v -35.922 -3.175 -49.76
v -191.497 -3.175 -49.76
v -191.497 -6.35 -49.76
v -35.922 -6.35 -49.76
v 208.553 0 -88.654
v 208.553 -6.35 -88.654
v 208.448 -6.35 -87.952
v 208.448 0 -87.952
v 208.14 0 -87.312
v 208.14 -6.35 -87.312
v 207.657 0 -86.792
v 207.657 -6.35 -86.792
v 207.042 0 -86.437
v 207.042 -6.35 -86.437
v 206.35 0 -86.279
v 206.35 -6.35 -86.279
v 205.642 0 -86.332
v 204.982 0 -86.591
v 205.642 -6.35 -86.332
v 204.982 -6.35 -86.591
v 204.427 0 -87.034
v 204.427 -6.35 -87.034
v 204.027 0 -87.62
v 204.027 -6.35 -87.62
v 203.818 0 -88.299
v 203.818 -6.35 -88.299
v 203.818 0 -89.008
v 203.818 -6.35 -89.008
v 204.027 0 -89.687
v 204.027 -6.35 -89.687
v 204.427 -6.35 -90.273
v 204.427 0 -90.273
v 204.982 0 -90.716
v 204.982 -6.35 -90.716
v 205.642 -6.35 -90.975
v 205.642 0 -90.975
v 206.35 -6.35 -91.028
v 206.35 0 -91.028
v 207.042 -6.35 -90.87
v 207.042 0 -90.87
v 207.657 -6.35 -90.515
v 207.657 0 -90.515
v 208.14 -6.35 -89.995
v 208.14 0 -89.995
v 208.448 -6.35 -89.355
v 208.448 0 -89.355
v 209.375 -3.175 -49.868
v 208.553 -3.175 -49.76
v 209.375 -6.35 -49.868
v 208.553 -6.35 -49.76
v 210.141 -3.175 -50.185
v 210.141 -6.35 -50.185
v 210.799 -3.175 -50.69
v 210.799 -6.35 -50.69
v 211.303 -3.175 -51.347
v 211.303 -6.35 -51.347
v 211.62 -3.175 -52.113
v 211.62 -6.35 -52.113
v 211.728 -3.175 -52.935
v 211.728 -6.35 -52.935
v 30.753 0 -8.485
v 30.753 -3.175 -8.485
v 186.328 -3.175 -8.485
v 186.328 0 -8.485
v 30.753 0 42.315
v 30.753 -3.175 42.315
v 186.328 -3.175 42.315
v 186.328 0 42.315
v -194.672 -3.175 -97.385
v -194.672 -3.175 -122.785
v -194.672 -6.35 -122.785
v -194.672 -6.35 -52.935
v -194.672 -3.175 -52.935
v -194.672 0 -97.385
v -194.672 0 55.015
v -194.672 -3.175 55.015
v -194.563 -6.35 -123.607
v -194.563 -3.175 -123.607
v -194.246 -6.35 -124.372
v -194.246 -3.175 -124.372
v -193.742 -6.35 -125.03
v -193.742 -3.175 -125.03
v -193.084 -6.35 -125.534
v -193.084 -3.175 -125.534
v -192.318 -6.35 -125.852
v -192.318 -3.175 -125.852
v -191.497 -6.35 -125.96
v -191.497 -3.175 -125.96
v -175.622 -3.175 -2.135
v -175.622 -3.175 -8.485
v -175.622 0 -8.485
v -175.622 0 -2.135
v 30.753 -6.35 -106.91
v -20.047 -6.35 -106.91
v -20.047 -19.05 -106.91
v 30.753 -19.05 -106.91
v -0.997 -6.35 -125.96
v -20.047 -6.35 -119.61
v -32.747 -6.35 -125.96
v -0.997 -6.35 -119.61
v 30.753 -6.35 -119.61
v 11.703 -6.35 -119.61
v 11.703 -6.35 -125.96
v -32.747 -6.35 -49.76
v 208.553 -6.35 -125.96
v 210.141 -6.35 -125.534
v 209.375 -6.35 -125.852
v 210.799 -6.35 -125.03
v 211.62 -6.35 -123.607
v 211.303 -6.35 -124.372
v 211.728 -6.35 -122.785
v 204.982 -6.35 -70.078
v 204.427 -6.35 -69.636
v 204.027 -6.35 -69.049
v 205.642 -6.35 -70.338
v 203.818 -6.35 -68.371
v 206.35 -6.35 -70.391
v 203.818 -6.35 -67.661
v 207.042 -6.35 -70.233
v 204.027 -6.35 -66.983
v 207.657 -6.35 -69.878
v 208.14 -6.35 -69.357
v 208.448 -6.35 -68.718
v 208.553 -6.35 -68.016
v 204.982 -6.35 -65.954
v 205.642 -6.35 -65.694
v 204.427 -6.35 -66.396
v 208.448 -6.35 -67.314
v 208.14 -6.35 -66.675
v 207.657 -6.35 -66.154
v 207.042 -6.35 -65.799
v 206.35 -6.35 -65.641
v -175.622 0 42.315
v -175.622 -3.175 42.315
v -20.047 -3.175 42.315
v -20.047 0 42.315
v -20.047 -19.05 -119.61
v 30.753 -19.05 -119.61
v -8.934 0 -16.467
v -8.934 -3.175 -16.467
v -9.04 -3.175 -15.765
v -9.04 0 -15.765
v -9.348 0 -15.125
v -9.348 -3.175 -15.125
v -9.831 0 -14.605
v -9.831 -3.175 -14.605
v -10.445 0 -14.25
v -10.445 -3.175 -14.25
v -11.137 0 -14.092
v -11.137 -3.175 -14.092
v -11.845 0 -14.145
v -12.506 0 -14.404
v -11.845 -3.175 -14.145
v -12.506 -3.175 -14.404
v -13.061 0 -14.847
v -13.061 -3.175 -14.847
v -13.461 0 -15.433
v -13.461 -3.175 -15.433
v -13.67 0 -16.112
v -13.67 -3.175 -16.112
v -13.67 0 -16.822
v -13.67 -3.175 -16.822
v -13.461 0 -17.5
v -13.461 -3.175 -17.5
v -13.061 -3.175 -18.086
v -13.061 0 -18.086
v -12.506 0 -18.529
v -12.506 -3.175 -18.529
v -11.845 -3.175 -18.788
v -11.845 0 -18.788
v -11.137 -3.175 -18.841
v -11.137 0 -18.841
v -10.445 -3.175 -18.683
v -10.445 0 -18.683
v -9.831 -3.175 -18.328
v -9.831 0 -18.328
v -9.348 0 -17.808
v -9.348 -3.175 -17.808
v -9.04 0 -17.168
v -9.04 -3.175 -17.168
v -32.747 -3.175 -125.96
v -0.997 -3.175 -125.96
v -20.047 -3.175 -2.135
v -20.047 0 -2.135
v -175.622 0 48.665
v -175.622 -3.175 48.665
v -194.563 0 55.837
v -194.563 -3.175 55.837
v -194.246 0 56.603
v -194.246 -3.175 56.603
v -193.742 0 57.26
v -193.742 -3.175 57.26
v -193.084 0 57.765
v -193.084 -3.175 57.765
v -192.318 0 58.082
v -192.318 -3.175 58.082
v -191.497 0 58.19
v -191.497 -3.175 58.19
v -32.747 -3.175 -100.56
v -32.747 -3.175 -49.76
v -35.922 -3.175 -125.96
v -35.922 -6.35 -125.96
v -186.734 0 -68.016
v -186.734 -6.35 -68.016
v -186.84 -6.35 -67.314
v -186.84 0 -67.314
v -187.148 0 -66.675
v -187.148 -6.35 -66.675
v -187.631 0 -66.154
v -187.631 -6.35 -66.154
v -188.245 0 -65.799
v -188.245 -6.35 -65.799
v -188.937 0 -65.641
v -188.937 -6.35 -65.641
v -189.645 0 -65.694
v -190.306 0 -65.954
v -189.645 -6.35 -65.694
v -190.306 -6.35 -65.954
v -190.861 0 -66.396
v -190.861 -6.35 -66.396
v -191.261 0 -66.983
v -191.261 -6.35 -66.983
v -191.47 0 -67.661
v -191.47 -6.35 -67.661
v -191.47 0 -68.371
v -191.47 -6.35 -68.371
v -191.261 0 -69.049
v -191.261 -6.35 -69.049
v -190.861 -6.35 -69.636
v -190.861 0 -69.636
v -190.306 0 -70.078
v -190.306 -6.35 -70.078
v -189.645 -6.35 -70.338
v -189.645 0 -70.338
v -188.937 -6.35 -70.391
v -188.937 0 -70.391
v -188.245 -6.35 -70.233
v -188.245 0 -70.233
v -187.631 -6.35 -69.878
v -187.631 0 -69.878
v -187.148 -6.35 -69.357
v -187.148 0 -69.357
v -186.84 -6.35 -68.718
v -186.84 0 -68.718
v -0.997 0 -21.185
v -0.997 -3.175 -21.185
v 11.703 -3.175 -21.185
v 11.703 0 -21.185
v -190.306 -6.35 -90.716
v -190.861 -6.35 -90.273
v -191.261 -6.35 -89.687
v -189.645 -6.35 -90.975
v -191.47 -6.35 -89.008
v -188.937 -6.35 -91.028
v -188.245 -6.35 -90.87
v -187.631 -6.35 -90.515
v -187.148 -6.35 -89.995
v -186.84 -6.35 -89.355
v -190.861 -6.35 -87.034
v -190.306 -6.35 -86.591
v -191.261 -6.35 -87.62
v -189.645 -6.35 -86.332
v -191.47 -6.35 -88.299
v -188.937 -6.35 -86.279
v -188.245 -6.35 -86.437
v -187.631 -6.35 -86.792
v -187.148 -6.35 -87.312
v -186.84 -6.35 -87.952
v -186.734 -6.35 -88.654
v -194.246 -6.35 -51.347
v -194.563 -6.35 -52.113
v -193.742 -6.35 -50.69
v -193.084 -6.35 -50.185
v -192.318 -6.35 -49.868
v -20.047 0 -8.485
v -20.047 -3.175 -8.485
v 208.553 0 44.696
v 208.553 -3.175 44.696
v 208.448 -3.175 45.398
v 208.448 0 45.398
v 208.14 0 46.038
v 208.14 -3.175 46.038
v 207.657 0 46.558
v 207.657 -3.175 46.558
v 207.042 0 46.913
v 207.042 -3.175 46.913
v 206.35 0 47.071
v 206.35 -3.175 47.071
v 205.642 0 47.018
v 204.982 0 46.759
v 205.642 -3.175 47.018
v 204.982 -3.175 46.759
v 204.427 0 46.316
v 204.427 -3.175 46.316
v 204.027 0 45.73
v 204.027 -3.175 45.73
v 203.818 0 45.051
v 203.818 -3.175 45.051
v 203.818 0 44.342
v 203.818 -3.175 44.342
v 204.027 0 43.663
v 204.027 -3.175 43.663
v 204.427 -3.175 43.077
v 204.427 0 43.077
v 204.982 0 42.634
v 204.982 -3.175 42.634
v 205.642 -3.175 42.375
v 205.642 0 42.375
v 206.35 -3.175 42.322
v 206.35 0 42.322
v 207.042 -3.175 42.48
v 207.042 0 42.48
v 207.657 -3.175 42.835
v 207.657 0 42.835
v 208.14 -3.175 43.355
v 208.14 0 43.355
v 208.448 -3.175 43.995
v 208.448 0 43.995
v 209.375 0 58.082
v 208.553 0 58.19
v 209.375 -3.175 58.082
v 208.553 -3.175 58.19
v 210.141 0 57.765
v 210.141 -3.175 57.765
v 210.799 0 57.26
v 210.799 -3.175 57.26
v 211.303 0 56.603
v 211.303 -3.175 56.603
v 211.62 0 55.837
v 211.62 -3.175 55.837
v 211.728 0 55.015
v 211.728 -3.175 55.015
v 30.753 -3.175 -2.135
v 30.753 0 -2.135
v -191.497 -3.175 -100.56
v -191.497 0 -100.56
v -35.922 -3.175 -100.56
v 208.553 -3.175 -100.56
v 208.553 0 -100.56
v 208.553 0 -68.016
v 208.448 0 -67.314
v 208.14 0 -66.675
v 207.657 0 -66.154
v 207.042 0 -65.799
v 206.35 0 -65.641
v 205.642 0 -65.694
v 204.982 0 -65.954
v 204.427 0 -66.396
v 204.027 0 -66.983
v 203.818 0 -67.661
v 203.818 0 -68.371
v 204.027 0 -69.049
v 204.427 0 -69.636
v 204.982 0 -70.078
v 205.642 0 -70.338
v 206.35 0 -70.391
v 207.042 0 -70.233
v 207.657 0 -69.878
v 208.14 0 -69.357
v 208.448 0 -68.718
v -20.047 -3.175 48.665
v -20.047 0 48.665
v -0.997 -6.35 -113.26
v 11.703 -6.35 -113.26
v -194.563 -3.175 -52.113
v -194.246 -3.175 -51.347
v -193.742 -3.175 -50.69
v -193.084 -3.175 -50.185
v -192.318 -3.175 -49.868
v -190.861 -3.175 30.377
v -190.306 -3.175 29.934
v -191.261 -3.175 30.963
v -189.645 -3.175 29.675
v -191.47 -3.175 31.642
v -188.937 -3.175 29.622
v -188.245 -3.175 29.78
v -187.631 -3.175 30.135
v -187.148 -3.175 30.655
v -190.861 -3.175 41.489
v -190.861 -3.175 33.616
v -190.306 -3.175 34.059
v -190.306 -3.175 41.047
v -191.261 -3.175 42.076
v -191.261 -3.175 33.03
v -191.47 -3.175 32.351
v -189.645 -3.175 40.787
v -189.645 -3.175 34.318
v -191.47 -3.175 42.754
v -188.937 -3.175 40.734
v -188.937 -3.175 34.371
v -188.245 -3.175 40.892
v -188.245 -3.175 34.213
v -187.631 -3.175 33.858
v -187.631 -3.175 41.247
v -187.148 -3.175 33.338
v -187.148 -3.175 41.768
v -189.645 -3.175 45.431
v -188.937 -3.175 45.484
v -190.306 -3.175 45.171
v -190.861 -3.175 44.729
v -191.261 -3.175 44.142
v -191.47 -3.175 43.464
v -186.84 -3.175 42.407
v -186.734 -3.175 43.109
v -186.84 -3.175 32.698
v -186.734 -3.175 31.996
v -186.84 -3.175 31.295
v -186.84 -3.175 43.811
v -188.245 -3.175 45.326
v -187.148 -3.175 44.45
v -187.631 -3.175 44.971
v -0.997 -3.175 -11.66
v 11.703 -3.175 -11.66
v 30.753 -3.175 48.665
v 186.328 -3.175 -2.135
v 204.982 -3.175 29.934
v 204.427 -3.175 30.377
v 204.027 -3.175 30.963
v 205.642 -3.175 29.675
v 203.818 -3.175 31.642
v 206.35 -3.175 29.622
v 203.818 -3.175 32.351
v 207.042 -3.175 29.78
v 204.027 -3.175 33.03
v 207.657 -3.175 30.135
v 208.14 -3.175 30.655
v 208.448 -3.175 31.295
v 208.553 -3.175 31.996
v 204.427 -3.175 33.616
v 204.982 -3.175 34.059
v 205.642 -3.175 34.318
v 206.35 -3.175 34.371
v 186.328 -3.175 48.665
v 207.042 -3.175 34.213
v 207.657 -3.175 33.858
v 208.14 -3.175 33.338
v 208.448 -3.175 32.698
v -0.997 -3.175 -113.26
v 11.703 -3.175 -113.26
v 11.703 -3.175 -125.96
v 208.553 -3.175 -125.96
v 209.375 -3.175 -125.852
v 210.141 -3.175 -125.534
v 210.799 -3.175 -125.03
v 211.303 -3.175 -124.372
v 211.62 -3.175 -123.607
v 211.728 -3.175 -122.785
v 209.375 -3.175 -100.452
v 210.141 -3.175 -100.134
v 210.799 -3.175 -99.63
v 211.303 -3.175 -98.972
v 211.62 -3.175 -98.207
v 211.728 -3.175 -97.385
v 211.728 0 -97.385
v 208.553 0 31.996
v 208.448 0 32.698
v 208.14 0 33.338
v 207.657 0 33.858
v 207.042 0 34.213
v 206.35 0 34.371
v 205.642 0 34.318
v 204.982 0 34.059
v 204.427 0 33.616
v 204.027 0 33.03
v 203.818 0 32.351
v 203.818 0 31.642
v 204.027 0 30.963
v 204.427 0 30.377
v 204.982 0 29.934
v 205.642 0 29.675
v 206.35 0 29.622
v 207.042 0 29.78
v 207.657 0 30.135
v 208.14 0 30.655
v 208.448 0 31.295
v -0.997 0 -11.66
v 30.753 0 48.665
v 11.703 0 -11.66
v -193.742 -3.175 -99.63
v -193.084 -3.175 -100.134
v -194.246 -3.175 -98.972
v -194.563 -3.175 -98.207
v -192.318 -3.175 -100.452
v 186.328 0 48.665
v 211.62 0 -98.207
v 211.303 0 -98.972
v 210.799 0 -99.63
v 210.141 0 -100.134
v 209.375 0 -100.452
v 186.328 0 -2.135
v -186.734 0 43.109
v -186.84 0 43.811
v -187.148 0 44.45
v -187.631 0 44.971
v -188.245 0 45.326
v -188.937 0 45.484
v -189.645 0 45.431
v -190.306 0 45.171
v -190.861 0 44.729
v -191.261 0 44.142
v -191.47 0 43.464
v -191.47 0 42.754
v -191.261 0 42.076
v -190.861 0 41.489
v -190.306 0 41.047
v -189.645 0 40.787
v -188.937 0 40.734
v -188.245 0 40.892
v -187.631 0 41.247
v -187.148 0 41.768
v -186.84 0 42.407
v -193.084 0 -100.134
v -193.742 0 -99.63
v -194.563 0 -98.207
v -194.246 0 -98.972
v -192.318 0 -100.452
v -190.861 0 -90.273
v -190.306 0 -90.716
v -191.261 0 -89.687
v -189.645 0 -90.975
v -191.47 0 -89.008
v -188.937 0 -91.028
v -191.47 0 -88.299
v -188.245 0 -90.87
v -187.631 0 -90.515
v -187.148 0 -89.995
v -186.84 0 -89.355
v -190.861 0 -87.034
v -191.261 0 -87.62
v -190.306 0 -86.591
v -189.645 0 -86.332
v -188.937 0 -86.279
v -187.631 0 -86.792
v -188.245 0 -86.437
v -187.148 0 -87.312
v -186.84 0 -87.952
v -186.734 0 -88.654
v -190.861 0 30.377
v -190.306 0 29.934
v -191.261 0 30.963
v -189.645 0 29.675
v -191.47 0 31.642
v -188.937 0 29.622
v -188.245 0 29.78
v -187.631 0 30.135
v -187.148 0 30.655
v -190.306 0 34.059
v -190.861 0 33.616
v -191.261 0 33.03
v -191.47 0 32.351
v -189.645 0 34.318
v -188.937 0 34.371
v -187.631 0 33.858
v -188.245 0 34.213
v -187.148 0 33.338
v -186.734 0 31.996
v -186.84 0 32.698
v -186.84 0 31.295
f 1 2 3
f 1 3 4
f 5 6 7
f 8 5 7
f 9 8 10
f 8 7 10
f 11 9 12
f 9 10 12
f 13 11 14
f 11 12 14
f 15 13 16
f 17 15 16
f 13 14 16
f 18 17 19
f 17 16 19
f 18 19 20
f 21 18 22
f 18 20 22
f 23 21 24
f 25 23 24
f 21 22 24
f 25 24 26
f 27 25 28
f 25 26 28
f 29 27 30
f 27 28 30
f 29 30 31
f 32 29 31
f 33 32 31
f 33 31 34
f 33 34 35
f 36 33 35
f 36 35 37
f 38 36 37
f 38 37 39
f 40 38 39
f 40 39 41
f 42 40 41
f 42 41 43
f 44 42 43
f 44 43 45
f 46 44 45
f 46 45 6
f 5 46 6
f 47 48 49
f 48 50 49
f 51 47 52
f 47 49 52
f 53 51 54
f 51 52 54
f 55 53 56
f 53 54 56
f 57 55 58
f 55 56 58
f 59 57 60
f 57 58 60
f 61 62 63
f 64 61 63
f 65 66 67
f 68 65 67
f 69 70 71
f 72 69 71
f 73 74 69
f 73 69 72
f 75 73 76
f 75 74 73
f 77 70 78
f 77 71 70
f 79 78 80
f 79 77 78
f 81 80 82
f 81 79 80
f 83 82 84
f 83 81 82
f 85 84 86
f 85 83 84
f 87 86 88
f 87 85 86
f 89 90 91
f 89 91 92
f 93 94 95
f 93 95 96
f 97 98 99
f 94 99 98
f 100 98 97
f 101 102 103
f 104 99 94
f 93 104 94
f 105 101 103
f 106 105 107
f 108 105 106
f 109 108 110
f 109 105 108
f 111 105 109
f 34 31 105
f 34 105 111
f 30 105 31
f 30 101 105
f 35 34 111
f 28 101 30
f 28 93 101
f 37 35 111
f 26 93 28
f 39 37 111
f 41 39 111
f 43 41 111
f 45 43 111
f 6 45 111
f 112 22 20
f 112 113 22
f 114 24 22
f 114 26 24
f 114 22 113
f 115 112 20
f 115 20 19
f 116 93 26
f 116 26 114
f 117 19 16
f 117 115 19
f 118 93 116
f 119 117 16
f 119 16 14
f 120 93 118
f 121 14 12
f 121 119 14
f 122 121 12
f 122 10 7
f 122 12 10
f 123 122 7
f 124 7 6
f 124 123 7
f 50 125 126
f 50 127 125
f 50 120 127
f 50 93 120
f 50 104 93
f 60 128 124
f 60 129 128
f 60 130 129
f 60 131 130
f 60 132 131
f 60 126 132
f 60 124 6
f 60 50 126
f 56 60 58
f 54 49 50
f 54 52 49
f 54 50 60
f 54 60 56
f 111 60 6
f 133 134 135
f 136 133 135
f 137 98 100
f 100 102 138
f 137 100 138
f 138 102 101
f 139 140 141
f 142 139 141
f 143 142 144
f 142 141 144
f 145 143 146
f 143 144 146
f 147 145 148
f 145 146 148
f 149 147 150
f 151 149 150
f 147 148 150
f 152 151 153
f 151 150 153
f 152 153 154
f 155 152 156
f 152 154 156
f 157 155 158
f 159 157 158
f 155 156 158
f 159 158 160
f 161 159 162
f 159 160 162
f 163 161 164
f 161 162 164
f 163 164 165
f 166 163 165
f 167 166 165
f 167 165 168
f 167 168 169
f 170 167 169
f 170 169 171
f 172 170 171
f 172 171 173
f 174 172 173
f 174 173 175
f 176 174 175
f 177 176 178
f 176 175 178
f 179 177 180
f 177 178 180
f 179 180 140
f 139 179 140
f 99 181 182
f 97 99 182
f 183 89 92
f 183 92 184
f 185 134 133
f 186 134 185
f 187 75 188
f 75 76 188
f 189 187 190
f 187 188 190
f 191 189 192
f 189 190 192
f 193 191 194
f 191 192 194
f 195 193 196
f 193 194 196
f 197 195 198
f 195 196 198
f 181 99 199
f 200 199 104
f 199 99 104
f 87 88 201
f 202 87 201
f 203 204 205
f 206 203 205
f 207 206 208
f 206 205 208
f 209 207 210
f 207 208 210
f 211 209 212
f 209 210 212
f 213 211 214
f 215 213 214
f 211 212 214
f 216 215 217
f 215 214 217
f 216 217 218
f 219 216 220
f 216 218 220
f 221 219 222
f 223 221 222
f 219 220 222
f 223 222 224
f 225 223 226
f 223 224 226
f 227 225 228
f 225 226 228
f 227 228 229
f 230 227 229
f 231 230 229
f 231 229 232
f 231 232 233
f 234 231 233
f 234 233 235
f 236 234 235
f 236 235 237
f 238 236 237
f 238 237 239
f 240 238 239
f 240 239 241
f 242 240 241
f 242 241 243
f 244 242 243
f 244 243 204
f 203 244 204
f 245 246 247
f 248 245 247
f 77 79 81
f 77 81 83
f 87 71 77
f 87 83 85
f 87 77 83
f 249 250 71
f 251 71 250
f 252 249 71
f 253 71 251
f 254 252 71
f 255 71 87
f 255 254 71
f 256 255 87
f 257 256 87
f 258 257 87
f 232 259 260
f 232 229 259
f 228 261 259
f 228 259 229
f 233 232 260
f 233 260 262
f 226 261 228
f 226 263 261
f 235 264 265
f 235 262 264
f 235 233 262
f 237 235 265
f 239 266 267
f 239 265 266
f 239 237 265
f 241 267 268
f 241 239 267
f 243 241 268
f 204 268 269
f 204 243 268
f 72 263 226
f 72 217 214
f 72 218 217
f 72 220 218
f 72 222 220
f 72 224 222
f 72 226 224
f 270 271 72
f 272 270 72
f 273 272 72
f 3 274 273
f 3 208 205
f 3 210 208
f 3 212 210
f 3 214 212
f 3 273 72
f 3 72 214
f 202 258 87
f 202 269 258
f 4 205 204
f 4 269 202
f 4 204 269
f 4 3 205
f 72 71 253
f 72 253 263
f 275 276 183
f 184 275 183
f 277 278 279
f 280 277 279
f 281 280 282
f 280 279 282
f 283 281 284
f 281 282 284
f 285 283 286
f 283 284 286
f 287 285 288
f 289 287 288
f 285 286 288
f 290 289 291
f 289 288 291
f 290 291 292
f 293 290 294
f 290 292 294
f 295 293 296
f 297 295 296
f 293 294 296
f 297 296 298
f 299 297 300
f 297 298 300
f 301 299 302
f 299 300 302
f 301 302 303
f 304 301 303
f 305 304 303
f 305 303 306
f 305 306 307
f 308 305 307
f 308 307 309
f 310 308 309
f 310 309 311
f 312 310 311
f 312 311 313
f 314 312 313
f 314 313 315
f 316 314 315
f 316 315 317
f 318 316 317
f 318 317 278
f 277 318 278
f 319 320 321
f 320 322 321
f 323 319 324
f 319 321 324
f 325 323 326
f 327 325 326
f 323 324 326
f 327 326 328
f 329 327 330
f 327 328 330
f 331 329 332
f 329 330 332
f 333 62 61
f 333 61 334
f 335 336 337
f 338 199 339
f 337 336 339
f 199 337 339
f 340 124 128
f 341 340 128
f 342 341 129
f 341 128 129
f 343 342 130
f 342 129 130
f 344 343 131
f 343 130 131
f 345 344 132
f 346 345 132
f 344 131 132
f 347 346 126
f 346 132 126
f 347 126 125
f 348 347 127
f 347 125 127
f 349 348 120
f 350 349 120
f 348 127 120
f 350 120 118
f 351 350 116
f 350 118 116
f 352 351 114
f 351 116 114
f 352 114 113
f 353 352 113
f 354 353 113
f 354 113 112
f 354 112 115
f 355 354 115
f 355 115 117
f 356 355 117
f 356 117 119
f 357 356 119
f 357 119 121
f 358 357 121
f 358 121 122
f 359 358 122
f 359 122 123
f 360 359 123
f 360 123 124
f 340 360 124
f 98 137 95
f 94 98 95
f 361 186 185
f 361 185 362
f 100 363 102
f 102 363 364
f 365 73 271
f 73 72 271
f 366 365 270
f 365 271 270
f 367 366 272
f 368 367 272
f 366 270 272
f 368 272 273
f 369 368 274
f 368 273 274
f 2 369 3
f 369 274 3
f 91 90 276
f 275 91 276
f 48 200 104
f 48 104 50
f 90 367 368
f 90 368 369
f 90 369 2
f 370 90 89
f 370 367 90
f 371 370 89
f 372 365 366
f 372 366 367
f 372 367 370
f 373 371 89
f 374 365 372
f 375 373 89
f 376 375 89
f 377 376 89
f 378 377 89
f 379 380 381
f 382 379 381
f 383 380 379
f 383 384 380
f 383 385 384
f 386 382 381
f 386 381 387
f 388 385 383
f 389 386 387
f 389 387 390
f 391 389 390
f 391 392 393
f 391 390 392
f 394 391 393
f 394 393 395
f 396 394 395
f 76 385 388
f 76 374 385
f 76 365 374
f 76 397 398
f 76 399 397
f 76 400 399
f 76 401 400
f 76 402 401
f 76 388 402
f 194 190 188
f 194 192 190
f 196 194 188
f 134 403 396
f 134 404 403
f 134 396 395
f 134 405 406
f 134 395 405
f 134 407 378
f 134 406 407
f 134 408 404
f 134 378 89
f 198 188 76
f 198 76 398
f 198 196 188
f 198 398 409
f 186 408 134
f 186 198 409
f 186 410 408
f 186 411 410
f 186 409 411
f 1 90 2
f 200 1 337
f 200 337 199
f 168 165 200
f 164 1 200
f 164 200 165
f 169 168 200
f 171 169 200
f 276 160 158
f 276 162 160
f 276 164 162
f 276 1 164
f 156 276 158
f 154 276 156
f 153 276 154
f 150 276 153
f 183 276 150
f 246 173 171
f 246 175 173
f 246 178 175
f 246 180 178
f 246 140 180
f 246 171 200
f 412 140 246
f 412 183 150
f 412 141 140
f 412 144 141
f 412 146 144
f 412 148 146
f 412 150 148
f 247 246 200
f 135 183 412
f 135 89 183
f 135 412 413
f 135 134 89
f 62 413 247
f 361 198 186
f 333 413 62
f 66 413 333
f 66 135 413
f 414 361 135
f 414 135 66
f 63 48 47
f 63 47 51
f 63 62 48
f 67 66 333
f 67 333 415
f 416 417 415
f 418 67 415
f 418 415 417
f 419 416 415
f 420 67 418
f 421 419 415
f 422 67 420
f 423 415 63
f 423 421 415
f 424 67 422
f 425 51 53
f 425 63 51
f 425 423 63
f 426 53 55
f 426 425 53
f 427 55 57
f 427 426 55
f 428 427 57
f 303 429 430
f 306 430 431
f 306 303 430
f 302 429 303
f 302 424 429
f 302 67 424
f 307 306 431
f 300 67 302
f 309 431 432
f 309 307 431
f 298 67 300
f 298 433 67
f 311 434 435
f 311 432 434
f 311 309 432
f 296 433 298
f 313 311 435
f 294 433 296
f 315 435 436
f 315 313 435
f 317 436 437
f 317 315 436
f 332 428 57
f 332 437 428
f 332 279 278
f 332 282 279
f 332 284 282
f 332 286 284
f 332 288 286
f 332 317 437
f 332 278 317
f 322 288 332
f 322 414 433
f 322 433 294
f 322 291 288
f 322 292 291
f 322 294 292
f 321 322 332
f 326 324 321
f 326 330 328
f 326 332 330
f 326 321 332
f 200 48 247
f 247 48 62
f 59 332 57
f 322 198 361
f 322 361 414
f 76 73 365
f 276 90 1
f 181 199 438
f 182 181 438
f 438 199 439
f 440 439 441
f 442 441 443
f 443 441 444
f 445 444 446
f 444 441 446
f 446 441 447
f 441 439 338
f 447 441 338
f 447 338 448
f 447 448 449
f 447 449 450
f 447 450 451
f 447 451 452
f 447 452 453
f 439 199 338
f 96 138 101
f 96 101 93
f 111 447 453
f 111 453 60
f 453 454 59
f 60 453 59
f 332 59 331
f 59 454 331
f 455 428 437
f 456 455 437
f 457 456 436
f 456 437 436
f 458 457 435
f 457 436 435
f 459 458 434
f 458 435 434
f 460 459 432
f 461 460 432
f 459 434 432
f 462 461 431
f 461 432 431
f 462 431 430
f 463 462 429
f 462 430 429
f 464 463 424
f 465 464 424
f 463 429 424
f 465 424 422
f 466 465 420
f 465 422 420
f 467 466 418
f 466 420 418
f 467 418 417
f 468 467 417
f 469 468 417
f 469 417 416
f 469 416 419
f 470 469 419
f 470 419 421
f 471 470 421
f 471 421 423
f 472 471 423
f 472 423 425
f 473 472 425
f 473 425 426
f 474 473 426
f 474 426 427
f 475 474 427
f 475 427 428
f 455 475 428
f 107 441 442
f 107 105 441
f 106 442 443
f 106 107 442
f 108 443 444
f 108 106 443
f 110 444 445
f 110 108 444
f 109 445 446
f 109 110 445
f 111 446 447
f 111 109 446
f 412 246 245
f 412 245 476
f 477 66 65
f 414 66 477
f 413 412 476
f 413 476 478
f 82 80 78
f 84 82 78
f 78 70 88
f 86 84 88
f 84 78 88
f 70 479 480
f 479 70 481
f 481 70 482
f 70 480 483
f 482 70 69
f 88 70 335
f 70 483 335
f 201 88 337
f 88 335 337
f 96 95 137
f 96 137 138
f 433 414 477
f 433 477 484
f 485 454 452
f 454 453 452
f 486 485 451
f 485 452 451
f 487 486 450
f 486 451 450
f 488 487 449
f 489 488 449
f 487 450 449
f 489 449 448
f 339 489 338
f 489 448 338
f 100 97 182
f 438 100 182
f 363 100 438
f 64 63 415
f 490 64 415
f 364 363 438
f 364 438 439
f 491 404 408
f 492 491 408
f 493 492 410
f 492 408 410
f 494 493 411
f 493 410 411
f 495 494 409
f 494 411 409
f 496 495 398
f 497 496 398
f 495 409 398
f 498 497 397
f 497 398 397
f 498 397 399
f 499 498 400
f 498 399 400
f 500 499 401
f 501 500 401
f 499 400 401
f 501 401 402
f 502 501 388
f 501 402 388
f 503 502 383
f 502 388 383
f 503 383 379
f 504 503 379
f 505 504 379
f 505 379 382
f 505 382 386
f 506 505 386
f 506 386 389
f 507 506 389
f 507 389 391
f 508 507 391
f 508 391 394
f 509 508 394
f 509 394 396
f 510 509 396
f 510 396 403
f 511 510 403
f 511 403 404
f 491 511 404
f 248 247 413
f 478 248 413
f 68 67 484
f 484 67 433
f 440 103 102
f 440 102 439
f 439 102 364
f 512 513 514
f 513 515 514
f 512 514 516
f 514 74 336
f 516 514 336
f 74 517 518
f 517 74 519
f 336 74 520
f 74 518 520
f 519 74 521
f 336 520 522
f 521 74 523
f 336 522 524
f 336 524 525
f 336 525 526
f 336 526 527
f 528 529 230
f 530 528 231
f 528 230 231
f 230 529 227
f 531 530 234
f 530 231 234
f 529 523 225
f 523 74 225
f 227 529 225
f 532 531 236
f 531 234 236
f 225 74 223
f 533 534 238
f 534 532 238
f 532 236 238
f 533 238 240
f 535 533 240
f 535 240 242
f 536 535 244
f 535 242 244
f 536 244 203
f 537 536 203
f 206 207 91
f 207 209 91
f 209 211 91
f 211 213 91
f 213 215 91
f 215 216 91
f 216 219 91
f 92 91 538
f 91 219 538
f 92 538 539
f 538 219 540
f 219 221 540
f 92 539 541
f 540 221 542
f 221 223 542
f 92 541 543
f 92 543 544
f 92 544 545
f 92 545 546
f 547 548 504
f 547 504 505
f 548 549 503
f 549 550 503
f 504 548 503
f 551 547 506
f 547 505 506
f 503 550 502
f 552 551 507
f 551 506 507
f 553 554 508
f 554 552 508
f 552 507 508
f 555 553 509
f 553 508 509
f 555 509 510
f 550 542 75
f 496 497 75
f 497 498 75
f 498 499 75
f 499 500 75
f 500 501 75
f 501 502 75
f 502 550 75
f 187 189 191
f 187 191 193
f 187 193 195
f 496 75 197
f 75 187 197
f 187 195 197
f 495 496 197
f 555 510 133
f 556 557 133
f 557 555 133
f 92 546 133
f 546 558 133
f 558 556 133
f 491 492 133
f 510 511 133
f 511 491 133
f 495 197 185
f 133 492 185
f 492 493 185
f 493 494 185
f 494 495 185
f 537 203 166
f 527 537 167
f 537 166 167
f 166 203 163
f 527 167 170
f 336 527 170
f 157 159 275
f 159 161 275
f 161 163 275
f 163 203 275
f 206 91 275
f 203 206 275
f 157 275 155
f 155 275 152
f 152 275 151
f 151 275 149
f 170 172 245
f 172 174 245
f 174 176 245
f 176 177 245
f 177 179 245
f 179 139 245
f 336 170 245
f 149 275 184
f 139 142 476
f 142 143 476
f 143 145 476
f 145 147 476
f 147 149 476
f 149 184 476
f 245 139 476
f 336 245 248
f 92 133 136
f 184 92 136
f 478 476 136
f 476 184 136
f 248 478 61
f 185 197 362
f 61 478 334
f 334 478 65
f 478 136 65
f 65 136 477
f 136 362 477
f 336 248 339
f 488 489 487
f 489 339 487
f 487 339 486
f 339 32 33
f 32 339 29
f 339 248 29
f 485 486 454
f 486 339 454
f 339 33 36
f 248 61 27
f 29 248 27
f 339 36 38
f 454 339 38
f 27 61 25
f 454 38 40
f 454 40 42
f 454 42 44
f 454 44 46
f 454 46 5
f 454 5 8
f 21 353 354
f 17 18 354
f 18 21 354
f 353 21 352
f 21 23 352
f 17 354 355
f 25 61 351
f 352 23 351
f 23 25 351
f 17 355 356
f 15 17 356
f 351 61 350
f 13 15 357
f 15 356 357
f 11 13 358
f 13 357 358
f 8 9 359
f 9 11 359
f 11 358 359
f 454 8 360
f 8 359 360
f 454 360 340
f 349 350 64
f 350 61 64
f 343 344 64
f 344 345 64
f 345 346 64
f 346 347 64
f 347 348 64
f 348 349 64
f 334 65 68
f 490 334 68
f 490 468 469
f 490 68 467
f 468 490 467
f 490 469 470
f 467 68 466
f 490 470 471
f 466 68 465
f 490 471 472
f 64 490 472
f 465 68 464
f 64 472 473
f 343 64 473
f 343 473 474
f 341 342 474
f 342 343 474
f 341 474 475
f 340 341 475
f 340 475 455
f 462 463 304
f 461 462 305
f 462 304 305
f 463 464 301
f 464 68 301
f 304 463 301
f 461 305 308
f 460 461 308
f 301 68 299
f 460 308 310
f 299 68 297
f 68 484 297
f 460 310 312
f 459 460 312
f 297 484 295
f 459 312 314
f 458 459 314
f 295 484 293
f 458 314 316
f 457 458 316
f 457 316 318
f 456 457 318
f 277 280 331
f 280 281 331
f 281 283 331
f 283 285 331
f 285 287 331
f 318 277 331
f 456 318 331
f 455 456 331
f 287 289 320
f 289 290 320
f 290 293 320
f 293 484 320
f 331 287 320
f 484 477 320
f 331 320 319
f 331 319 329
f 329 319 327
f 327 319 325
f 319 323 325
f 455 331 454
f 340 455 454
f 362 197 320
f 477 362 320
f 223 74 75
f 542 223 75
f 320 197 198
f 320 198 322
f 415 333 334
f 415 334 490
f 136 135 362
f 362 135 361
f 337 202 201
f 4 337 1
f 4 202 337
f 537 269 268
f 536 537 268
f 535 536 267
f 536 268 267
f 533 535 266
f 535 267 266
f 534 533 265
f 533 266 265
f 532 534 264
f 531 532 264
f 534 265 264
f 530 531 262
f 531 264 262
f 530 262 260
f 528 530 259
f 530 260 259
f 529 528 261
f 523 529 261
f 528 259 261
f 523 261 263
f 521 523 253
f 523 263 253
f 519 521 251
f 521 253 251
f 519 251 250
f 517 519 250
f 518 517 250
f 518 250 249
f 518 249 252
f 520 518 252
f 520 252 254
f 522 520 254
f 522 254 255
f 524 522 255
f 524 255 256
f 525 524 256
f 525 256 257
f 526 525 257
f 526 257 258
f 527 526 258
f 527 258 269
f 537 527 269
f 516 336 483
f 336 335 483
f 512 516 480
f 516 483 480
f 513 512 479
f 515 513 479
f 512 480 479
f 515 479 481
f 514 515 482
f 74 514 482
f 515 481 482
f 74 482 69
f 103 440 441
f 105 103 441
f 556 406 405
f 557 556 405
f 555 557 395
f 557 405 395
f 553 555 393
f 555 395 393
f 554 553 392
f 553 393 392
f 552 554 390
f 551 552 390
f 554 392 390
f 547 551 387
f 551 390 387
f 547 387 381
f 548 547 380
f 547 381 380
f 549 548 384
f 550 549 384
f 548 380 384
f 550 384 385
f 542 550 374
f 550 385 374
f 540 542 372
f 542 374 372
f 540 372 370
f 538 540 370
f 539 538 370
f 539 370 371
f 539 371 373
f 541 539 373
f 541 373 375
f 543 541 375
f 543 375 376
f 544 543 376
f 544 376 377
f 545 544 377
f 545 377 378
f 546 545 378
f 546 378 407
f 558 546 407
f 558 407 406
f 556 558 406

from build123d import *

# Parameters (mm, degrees)
F0_W      = 406.4
F0_H      = 158.75
F1_DEPTH  = 3.175
F2_R      = 3.175
F3_R      = 3.175
F4_R      = 3.175
F5_R      = 3.175
F6_W      = 155.575
F6_H      = 6.35
F7_DEPTH  = 3.175
F8_W      = 155.575
F8_H      = 6.35
F9_DEPTH  = 3.175
F10_W     = 155.575
F10_H     = 6.35
F11_DEPTH = 3.175
F12_W     = 155.575
F12_H     = 6.35
F13_DEPTH = 25.4
F14_W     = 12.7
F14_H     = 9.525
F15_DEPTH = 25.4
F16_R     = 2.38125
F17_DEPTH = 3.175
F18_R     = 2.38125
F19_DEPTH = 25.4
F20_R     = 2.38125
F21_DEPTH = 25.4
F22_W     = 406.4
F22_H     = 76.2
F23_DEPTH = 3.175
F24_R     = 3.175
F25_R     = 3.175
F26_W     = 12.7
F26_H     = 12.7
F27_DEPTH = 25.4
F28_R     = 2.38125
F29_DEPTH = 25.4
F30_W     = 50.8
F30_H     = 12.7
F31_DEPTH = 12.7
F32_W     = 3.175
F32_H     = 76.2
F33_DEPTH = 3.175


with BuildPart() as f1:
    # F0 (on Front) → F1 (new body)
    with BuildSketch(Plane.XZ):
        with Locations((8.5284784436, -21.1847552925)):
            Rectangle(F0_W, F0_H)
    extrude(amount=F1_DEPTH)

    # F2
    f2_edges = [f1.edges().sort_by_distance(p)[0] for p in [
        (-194.671522, -1.5875, 58.190245),
    ]]
    fillet(f2_edges, radius=F2_R)

    # F3
    f3_edges = [f1.edges().sort_by_distance(p)[0] for p in [
        (211.728478, -1.5875, 58.190245),
    ]]
    fillet(f3_edges, radius=F3_R)

    # F4
    f4_edges = [f1.edges().sort_by_distance(p)[0] for p in [
        (211.728478, -1.5875, -100.559755),
    ]]
    fillet(f4_edges, radius=F4_R)

    # F5
    f5_edges = [f1.edges().sort_by_distance(p)[0] for p in [
        (-194.671522, -1.5875, -100.559755),
    ]]
    fillet(f5_edges, radius=F5_R)

    # F6 (on face) → F7 (cut)
    with BuildSketch(Plane.XZ.offset(3.175)):
        with Locations((-97.8340215564, 45.4902447075)):
            Rectangle(F6_W, F6_H)
    extrude(amount=-F7_DEPTH, mode=Mode.SUBTRACT)

    # F8 (on face) → F9 (cut)
    with BuildSketch(Plane.XZ.offset(3.175)):
        with Locations((-97.8340215564, -5.3097552925)):
            Rectangle(F8_W, F8_H)
    extrude(amount=-F9_DEPTH, mode=Mode.SUBTRACT)

    # F10 (on face) → F11 (cut)
    with BuildSketch(Plane.XZ.offset(3.175)):
        with Locations((108.5409784436, 45.4902447075)):
            Rectangle(F10_W, F10_H)
    extrude(amount=-F11_DEPTH, mode=Mode.SUBTRACT)

    # F12 (on face) → F13 (cut)
    with BuildSketch(Plane.XZ.offset(3.175)):
        with Locations((108.5409784436, -5.3097552925)):
            Rectangle(F12_W, F12_H)
    extrude(amount=-F13_DEPTH, mode=Mode.SUBTRACT)

    # F14 (on face) → F15 (cut)
    with BuildSketch(Plane.XZ.offset(3.175)):
        with Locations((5.3534784436, -16.4222552925)):
            Rectangle(F14_W, F14_H)
    extrude(amount=-F15_DEPTH, mode=Mode.SUBTRACT)

    # F16 (on face) → F17 (cut)
    with BuildSketch(Plane.XZ.offset(3.175)):
        with Locations((-11.3152715564, -16.4666101336)):
            Circle(F16_R)
    extrude(amount=-F17_DEPTH, mode=Mode.SUBTRACT)

    # F18 (on face) → F19 (cut)
    with BuildSketch(Plane.XZ.offset(3.175)):
        with Locations((-189.1152715564, 43.1089947075)):
            Circle(F18_R)
        with Locations((-189.1152715564, 31.9964947075)):
            Circle(F18_R)
    extrude(amount=-F19_DEPTH, mode=Mode.SUBTRACT)

    # F20 (on face) → F21 (cut)
    with BuildSketch(Plane.XZ.offset(3.175)):
        with Locations((206.1722284436, 44.6964947075)):
            Circle(F20_R)
        with Locations((206.1722284436, 31.9964947075)):
            Circle(F20_R)
    extrude(amount=-F21_DEPTH, mode=Mode.SUBTRACT)

    # F22 (on face) → F23 (join)
    with BuildSketch(Plane.XZ.offset(3.175)):
        with Locations((8.5284784436, -87.8597552925)):
            Rectangle(F22_W, F22_H)
    extrude(amount=F23_DEPTH)

    # F24
    f24_edges = [f1.edges().sort_by_distance(p)[0] for p in [
        (-194.671522, -4.7625, -125.959755),
        (211.728478, -4.7625, -125.959755),
    ]]
    fillet(f24_edges, radius=F24_R)

    # F25
    f25_edges = [f1.edges().sort_by_distance(p)[0] for p in [
        (211.728478, -4.7625, -49.759755),
        (-194.671522, -4.7625, -49.759755),
    ]]
    fillet(f25_edges, radius=F25_R)

    # F26 (on face) → F27 (cut)
    with BuildSketch(Plane.XZ.offset(6.35)):
        with Locations((5.3534784436, -119.6097552925)):
            Rectangle(F26_W, F26_H)
    extrude(amount=-F27_DEPTH, mode=Mode.SUBTRACT)

    # F28 (on face) → F29 (cut)
    with BuildSketch(Plane.XZ.offset(6.35)):
        with Locations((206.1722284436, -68.0160052925)):
            Circle(F28_R)
        with Locations((206.1722284436, -88.6535052925)):
            Circle(F28_R)
        with Locations((-189.1152715564, -68.0160052925)):
            Circle(F28_R)
        with Locations((-189.1152715564, -88.6535052925)):
            Circle(F28_R)
    extrude(amount=-F29_DEPTH, mode=Mode.SUBTRACT)

    # F30 (on face) → F31 (join)
    with BuildSketch(Plane.XZ.offset(6.35)):
        with Locations((5.3534784436, -113.2597552925)):
            Rectangle(F30_W, F30_H)
    extrude(amount=F31_DEPTH)

    # F32 (on face) → F33 (cut)
    with BuildSketch(Plane.XZ.offset(6.35)):
        with Locations((-34.3340215564, -87.8597552925)):
            Rectangle(F32_W, F32_H)
    extrude(amount=-F33_DEPTH, mode=Mode.SUBTRACT)


solid = f1.part
